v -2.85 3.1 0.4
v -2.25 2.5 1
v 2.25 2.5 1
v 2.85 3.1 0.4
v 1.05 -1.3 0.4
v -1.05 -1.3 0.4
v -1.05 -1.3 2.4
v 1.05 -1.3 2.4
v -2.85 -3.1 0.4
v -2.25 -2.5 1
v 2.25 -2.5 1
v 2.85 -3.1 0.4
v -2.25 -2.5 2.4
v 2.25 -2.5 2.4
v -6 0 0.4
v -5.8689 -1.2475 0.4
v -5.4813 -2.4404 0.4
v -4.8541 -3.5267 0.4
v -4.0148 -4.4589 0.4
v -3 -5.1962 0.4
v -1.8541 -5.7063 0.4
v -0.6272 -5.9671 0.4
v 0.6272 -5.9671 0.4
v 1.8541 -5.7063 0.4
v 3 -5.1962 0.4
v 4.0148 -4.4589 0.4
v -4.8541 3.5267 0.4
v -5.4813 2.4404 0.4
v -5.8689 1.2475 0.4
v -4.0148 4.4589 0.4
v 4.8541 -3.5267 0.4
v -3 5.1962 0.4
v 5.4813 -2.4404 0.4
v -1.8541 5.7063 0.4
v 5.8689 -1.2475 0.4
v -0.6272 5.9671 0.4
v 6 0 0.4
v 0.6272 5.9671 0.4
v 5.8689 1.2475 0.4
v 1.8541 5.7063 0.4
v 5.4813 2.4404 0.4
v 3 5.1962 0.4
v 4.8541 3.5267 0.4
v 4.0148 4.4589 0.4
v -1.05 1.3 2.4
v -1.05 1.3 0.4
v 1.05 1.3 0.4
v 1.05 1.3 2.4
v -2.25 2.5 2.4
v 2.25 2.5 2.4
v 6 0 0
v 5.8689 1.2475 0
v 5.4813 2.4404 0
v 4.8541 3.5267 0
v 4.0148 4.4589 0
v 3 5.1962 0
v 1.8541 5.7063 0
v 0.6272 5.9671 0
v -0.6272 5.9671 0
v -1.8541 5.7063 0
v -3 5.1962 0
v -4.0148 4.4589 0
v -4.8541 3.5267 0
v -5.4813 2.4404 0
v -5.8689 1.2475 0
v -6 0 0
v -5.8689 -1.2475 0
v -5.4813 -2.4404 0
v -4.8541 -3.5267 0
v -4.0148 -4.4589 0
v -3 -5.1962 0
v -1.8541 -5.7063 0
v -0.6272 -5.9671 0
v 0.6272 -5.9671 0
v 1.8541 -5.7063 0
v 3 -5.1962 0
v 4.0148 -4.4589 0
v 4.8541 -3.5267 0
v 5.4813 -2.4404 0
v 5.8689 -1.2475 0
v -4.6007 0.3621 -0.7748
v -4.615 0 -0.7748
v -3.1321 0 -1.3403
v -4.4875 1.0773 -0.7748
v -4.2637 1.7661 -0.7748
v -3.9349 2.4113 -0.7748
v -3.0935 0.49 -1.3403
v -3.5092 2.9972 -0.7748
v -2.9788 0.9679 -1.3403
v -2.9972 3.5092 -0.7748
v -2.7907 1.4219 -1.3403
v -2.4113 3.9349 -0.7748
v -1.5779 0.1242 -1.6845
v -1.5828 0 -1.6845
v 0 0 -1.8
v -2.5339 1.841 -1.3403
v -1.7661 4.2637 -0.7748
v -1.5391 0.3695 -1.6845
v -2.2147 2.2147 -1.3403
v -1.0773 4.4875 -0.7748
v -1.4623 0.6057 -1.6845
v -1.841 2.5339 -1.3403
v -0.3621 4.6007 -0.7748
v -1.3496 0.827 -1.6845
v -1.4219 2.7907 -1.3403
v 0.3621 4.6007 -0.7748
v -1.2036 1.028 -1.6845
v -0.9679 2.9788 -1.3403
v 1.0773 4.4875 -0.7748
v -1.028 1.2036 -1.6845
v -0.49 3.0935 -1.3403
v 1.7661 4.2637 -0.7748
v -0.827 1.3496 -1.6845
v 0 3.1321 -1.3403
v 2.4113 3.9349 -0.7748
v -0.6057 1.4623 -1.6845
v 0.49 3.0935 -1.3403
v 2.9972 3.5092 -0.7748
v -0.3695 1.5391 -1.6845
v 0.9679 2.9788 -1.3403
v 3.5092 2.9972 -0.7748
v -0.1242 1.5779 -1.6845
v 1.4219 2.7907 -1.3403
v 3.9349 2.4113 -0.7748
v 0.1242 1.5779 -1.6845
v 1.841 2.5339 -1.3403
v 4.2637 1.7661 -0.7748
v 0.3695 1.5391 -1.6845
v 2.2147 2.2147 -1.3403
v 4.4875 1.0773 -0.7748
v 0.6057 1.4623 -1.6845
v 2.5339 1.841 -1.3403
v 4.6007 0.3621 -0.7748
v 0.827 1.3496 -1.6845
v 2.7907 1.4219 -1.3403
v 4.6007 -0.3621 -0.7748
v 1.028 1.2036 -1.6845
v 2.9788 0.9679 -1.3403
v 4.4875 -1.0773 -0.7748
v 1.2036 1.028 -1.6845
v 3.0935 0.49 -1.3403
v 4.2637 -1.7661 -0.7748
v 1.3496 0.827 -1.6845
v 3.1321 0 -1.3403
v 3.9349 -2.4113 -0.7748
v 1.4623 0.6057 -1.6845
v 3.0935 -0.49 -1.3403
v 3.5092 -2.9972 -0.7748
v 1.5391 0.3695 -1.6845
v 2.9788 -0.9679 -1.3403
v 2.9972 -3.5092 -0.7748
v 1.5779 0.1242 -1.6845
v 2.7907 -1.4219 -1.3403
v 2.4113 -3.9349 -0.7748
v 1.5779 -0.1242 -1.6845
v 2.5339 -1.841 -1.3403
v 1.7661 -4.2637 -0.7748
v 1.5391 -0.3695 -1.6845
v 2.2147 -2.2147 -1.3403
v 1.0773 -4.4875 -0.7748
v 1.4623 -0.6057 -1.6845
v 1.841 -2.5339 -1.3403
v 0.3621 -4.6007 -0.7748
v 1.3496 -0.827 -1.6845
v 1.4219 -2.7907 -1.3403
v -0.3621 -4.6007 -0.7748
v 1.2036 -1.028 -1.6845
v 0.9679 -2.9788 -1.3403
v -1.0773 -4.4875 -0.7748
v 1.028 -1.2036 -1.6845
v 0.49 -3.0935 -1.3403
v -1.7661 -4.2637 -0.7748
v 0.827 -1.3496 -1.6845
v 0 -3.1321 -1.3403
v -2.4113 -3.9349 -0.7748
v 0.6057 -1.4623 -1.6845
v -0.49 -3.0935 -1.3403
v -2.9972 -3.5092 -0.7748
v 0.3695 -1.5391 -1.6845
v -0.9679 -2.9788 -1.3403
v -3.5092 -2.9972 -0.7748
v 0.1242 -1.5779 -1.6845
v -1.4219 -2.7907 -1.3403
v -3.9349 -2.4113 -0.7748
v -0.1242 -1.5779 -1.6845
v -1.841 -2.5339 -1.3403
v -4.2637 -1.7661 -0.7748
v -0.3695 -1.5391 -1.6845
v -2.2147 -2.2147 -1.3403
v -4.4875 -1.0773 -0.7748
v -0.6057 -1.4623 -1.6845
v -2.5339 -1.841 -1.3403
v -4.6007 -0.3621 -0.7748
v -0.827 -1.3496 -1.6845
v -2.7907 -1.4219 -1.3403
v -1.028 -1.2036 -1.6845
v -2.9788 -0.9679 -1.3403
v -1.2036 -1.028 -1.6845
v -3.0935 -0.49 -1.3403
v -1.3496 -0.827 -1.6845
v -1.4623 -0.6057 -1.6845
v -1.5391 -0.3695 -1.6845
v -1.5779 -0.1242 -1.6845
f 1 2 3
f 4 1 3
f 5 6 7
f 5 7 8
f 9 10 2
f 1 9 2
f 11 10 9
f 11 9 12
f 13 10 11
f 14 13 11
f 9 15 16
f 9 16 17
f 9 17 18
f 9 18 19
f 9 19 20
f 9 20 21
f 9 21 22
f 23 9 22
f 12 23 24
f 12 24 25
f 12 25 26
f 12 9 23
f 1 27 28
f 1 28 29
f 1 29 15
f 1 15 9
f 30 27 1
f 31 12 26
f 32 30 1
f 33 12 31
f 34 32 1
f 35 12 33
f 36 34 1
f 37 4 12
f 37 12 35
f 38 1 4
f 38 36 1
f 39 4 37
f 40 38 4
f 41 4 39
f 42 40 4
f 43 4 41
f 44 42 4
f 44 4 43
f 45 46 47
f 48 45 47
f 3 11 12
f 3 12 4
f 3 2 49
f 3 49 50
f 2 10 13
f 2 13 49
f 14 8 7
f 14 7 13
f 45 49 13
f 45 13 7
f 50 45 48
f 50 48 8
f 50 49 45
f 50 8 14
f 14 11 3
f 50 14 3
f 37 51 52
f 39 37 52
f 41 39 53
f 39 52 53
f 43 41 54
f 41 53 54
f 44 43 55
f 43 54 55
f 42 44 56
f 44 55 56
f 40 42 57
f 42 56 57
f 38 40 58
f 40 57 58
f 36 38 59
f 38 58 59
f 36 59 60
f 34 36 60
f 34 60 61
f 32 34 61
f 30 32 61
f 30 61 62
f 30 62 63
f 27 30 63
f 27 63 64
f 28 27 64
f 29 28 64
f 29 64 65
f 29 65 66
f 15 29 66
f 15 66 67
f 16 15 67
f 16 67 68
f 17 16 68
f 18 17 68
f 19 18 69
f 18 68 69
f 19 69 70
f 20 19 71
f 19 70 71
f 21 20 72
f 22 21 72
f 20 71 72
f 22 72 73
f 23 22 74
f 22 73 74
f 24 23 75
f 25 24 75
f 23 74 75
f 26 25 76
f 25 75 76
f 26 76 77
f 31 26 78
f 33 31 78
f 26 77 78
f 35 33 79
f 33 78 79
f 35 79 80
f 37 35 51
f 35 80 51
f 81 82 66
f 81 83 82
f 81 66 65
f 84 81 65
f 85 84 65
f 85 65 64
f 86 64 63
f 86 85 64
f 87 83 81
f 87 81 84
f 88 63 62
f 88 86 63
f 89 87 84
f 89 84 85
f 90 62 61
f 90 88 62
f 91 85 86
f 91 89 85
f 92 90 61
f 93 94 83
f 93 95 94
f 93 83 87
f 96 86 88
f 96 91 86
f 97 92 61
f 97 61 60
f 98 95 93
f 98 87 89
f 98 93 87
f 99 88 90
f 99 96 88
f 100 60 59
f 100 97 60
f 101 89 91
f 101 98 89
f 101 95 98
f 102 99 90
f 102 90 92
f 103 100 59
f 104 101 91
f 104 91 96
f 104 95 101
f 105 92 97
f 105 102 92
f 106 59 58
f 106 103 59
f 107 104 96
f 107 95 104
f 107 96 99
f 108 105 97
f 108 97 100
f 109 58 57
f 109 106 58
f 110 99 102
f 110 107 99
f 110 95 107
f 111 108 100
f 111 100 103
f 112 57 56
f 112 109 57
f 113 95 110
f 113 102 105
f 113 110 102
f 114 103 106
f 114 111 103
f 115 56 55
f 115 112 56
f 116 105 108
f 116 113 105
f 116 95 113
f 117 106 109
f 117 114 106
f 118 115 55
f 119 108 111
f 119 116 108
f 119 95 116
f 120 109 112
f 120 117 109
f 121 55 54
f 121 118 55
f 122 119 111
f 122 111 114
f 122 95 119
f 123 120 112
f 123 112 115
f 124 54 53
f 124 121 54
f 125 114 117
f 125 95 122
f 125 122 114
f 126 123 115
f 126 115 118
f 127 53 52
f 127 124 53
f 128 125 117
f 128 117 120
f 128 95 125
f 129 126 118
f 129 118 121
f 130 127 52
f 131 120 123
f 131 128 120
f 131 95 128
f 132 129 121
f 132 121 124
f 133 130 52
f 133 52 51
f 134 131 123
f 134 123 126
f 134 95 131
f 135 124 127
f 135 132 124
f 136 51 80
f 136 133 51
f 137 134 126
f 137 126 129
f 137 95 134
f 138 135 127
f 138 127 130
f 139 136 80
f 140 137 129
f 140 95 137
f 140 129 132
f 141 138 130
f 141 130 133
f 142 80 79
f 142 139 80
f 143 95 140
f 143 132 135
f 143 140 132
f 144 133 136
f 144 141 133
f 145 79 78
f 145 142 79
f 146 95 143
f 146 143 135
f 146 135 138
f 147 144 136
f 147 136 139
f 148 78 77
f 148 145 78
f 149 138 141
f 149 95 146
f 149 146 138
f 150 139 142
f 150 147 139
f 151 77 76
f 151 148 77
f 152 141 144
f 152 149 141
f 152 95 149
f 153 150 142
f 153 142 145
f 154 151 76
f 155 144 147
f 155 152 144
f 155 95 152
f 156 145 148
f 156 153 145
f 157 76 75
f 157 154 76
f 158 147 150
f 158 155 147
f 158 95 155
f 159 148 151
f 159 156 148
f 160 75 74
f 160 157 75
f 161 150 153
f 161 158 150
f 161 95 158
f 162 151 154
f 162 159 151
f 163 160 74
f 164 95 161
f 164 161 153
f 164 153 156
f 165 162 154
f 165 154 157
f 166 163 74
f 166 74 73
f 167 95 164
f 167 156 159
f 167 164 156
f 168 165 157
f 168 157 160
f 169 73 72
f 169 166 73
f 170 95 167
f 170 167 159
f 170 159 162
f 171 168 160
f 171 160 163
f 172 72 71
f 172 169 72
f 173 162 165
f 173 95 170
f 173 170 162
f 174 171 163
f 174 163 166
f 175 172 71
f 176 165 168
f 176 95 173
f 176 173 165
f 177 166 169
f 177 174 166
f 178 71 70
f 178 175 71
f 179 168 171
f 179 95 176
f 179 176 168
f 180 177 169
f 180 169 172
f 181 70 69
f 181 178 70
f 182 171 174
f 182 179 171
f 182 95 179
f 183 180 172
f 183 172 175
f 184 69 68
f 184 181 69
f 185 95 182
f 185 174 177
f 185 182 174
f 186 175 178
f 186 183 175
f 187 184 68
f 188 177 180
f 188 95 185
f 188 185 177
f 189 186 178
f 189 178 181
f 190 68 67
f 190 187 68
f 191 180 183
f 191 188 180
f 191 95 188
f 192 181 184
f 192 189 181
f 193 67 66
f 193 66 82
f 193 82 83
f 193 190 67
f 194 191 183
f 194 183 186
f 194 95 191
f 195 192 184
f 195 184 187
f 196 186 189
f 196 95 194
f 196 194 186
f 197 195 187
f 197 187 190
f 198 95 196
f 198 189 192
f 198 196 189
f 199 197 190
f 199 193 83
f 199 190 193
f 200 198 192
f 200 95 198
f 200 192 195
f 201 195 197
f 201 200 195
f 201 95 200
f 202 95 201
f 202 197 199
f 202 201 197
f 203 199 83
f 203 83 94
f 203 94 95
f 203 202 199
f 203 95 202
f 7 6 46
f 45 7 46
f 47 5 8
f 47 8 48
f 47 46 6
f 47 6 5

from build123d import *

# Parameters (mm, degrees)
ESQUISSE1_R        = 6
BOSS_EXTRU_1_DEPTH = 0.4
D_ME1_FACE_RADIUS  = 6
D_ME1_HEIGHT       = 1.8
ESQUISSE3_W        = 4.5
ESQUISSE3_H        = 5
ESQUISSE3_W_2      = 2.1
ESQUISSE3_H_2      = 2.6
EXTRU_MINCE1_DEPTH = 2
CHANFREIN1_SIZE    = 0.6


with BuildPart() as part:
    # Esquisse1 → Boss.-Extru.1 (new body)
    with BuildSketch(Plane.XY):
        Circle(ESQUISSE1_R)
    extrude(amount=BOSS_EXTRU_1_DEPTH)

    # Dôme1: a dome of height H over a round flat face of radius A is a cap of a sphere of radius (A * A + H * H) / (2 * H)
    d_me1_r = (D_ME1_FACE_RADIUS * D_ME1_FACE_RADIUS + D_ME1_HEIGHT * D_ME1_HEIGHT) / (2 * D_ME1_HEIGHT)
    d_me1_base = Plane((0, 0, 0), z_dir=(0, 0, -1))
    with Locations(d_me1_base.offset(D_ME1_HEIGHT - d_me1_r)):
        d_me1_ball = Sphere(d_me1_r, mode=Mode.PRIVATE)
    add(split(d_me1_ball, bisect_by=d_me1_base, keep=Keep.TOP, mode=Mode.PRIVATE))

    # Esquisse3 → Extru.-Mince1 (add)
    with BuildSketch(Plane.XY.offset(0.4)):
        Rectangle(ESQUISSE3_W, ESQUISSE3_H)
        Rectangle(ESQUISSE3_W_2, ESQUISSE3_H_2, mode=Mode.SUBTRACT)
    extrude(amount=EXTRU_MINCE1_DEPTH)

    # Chanfrein1
    chanfrein1_edges = [part.edges().sort_by_distance(p)[0] for p in [
        (2.25, 0, 0.4),
        (0, 2.5, 0.4),
        (-2.25, 0, 0.4),
        (0, -2.5, 0.4),
    ]]
    chamfer(chanfrein1_edges, length=CHANFREIN1_SIZE)


solid = part.part
